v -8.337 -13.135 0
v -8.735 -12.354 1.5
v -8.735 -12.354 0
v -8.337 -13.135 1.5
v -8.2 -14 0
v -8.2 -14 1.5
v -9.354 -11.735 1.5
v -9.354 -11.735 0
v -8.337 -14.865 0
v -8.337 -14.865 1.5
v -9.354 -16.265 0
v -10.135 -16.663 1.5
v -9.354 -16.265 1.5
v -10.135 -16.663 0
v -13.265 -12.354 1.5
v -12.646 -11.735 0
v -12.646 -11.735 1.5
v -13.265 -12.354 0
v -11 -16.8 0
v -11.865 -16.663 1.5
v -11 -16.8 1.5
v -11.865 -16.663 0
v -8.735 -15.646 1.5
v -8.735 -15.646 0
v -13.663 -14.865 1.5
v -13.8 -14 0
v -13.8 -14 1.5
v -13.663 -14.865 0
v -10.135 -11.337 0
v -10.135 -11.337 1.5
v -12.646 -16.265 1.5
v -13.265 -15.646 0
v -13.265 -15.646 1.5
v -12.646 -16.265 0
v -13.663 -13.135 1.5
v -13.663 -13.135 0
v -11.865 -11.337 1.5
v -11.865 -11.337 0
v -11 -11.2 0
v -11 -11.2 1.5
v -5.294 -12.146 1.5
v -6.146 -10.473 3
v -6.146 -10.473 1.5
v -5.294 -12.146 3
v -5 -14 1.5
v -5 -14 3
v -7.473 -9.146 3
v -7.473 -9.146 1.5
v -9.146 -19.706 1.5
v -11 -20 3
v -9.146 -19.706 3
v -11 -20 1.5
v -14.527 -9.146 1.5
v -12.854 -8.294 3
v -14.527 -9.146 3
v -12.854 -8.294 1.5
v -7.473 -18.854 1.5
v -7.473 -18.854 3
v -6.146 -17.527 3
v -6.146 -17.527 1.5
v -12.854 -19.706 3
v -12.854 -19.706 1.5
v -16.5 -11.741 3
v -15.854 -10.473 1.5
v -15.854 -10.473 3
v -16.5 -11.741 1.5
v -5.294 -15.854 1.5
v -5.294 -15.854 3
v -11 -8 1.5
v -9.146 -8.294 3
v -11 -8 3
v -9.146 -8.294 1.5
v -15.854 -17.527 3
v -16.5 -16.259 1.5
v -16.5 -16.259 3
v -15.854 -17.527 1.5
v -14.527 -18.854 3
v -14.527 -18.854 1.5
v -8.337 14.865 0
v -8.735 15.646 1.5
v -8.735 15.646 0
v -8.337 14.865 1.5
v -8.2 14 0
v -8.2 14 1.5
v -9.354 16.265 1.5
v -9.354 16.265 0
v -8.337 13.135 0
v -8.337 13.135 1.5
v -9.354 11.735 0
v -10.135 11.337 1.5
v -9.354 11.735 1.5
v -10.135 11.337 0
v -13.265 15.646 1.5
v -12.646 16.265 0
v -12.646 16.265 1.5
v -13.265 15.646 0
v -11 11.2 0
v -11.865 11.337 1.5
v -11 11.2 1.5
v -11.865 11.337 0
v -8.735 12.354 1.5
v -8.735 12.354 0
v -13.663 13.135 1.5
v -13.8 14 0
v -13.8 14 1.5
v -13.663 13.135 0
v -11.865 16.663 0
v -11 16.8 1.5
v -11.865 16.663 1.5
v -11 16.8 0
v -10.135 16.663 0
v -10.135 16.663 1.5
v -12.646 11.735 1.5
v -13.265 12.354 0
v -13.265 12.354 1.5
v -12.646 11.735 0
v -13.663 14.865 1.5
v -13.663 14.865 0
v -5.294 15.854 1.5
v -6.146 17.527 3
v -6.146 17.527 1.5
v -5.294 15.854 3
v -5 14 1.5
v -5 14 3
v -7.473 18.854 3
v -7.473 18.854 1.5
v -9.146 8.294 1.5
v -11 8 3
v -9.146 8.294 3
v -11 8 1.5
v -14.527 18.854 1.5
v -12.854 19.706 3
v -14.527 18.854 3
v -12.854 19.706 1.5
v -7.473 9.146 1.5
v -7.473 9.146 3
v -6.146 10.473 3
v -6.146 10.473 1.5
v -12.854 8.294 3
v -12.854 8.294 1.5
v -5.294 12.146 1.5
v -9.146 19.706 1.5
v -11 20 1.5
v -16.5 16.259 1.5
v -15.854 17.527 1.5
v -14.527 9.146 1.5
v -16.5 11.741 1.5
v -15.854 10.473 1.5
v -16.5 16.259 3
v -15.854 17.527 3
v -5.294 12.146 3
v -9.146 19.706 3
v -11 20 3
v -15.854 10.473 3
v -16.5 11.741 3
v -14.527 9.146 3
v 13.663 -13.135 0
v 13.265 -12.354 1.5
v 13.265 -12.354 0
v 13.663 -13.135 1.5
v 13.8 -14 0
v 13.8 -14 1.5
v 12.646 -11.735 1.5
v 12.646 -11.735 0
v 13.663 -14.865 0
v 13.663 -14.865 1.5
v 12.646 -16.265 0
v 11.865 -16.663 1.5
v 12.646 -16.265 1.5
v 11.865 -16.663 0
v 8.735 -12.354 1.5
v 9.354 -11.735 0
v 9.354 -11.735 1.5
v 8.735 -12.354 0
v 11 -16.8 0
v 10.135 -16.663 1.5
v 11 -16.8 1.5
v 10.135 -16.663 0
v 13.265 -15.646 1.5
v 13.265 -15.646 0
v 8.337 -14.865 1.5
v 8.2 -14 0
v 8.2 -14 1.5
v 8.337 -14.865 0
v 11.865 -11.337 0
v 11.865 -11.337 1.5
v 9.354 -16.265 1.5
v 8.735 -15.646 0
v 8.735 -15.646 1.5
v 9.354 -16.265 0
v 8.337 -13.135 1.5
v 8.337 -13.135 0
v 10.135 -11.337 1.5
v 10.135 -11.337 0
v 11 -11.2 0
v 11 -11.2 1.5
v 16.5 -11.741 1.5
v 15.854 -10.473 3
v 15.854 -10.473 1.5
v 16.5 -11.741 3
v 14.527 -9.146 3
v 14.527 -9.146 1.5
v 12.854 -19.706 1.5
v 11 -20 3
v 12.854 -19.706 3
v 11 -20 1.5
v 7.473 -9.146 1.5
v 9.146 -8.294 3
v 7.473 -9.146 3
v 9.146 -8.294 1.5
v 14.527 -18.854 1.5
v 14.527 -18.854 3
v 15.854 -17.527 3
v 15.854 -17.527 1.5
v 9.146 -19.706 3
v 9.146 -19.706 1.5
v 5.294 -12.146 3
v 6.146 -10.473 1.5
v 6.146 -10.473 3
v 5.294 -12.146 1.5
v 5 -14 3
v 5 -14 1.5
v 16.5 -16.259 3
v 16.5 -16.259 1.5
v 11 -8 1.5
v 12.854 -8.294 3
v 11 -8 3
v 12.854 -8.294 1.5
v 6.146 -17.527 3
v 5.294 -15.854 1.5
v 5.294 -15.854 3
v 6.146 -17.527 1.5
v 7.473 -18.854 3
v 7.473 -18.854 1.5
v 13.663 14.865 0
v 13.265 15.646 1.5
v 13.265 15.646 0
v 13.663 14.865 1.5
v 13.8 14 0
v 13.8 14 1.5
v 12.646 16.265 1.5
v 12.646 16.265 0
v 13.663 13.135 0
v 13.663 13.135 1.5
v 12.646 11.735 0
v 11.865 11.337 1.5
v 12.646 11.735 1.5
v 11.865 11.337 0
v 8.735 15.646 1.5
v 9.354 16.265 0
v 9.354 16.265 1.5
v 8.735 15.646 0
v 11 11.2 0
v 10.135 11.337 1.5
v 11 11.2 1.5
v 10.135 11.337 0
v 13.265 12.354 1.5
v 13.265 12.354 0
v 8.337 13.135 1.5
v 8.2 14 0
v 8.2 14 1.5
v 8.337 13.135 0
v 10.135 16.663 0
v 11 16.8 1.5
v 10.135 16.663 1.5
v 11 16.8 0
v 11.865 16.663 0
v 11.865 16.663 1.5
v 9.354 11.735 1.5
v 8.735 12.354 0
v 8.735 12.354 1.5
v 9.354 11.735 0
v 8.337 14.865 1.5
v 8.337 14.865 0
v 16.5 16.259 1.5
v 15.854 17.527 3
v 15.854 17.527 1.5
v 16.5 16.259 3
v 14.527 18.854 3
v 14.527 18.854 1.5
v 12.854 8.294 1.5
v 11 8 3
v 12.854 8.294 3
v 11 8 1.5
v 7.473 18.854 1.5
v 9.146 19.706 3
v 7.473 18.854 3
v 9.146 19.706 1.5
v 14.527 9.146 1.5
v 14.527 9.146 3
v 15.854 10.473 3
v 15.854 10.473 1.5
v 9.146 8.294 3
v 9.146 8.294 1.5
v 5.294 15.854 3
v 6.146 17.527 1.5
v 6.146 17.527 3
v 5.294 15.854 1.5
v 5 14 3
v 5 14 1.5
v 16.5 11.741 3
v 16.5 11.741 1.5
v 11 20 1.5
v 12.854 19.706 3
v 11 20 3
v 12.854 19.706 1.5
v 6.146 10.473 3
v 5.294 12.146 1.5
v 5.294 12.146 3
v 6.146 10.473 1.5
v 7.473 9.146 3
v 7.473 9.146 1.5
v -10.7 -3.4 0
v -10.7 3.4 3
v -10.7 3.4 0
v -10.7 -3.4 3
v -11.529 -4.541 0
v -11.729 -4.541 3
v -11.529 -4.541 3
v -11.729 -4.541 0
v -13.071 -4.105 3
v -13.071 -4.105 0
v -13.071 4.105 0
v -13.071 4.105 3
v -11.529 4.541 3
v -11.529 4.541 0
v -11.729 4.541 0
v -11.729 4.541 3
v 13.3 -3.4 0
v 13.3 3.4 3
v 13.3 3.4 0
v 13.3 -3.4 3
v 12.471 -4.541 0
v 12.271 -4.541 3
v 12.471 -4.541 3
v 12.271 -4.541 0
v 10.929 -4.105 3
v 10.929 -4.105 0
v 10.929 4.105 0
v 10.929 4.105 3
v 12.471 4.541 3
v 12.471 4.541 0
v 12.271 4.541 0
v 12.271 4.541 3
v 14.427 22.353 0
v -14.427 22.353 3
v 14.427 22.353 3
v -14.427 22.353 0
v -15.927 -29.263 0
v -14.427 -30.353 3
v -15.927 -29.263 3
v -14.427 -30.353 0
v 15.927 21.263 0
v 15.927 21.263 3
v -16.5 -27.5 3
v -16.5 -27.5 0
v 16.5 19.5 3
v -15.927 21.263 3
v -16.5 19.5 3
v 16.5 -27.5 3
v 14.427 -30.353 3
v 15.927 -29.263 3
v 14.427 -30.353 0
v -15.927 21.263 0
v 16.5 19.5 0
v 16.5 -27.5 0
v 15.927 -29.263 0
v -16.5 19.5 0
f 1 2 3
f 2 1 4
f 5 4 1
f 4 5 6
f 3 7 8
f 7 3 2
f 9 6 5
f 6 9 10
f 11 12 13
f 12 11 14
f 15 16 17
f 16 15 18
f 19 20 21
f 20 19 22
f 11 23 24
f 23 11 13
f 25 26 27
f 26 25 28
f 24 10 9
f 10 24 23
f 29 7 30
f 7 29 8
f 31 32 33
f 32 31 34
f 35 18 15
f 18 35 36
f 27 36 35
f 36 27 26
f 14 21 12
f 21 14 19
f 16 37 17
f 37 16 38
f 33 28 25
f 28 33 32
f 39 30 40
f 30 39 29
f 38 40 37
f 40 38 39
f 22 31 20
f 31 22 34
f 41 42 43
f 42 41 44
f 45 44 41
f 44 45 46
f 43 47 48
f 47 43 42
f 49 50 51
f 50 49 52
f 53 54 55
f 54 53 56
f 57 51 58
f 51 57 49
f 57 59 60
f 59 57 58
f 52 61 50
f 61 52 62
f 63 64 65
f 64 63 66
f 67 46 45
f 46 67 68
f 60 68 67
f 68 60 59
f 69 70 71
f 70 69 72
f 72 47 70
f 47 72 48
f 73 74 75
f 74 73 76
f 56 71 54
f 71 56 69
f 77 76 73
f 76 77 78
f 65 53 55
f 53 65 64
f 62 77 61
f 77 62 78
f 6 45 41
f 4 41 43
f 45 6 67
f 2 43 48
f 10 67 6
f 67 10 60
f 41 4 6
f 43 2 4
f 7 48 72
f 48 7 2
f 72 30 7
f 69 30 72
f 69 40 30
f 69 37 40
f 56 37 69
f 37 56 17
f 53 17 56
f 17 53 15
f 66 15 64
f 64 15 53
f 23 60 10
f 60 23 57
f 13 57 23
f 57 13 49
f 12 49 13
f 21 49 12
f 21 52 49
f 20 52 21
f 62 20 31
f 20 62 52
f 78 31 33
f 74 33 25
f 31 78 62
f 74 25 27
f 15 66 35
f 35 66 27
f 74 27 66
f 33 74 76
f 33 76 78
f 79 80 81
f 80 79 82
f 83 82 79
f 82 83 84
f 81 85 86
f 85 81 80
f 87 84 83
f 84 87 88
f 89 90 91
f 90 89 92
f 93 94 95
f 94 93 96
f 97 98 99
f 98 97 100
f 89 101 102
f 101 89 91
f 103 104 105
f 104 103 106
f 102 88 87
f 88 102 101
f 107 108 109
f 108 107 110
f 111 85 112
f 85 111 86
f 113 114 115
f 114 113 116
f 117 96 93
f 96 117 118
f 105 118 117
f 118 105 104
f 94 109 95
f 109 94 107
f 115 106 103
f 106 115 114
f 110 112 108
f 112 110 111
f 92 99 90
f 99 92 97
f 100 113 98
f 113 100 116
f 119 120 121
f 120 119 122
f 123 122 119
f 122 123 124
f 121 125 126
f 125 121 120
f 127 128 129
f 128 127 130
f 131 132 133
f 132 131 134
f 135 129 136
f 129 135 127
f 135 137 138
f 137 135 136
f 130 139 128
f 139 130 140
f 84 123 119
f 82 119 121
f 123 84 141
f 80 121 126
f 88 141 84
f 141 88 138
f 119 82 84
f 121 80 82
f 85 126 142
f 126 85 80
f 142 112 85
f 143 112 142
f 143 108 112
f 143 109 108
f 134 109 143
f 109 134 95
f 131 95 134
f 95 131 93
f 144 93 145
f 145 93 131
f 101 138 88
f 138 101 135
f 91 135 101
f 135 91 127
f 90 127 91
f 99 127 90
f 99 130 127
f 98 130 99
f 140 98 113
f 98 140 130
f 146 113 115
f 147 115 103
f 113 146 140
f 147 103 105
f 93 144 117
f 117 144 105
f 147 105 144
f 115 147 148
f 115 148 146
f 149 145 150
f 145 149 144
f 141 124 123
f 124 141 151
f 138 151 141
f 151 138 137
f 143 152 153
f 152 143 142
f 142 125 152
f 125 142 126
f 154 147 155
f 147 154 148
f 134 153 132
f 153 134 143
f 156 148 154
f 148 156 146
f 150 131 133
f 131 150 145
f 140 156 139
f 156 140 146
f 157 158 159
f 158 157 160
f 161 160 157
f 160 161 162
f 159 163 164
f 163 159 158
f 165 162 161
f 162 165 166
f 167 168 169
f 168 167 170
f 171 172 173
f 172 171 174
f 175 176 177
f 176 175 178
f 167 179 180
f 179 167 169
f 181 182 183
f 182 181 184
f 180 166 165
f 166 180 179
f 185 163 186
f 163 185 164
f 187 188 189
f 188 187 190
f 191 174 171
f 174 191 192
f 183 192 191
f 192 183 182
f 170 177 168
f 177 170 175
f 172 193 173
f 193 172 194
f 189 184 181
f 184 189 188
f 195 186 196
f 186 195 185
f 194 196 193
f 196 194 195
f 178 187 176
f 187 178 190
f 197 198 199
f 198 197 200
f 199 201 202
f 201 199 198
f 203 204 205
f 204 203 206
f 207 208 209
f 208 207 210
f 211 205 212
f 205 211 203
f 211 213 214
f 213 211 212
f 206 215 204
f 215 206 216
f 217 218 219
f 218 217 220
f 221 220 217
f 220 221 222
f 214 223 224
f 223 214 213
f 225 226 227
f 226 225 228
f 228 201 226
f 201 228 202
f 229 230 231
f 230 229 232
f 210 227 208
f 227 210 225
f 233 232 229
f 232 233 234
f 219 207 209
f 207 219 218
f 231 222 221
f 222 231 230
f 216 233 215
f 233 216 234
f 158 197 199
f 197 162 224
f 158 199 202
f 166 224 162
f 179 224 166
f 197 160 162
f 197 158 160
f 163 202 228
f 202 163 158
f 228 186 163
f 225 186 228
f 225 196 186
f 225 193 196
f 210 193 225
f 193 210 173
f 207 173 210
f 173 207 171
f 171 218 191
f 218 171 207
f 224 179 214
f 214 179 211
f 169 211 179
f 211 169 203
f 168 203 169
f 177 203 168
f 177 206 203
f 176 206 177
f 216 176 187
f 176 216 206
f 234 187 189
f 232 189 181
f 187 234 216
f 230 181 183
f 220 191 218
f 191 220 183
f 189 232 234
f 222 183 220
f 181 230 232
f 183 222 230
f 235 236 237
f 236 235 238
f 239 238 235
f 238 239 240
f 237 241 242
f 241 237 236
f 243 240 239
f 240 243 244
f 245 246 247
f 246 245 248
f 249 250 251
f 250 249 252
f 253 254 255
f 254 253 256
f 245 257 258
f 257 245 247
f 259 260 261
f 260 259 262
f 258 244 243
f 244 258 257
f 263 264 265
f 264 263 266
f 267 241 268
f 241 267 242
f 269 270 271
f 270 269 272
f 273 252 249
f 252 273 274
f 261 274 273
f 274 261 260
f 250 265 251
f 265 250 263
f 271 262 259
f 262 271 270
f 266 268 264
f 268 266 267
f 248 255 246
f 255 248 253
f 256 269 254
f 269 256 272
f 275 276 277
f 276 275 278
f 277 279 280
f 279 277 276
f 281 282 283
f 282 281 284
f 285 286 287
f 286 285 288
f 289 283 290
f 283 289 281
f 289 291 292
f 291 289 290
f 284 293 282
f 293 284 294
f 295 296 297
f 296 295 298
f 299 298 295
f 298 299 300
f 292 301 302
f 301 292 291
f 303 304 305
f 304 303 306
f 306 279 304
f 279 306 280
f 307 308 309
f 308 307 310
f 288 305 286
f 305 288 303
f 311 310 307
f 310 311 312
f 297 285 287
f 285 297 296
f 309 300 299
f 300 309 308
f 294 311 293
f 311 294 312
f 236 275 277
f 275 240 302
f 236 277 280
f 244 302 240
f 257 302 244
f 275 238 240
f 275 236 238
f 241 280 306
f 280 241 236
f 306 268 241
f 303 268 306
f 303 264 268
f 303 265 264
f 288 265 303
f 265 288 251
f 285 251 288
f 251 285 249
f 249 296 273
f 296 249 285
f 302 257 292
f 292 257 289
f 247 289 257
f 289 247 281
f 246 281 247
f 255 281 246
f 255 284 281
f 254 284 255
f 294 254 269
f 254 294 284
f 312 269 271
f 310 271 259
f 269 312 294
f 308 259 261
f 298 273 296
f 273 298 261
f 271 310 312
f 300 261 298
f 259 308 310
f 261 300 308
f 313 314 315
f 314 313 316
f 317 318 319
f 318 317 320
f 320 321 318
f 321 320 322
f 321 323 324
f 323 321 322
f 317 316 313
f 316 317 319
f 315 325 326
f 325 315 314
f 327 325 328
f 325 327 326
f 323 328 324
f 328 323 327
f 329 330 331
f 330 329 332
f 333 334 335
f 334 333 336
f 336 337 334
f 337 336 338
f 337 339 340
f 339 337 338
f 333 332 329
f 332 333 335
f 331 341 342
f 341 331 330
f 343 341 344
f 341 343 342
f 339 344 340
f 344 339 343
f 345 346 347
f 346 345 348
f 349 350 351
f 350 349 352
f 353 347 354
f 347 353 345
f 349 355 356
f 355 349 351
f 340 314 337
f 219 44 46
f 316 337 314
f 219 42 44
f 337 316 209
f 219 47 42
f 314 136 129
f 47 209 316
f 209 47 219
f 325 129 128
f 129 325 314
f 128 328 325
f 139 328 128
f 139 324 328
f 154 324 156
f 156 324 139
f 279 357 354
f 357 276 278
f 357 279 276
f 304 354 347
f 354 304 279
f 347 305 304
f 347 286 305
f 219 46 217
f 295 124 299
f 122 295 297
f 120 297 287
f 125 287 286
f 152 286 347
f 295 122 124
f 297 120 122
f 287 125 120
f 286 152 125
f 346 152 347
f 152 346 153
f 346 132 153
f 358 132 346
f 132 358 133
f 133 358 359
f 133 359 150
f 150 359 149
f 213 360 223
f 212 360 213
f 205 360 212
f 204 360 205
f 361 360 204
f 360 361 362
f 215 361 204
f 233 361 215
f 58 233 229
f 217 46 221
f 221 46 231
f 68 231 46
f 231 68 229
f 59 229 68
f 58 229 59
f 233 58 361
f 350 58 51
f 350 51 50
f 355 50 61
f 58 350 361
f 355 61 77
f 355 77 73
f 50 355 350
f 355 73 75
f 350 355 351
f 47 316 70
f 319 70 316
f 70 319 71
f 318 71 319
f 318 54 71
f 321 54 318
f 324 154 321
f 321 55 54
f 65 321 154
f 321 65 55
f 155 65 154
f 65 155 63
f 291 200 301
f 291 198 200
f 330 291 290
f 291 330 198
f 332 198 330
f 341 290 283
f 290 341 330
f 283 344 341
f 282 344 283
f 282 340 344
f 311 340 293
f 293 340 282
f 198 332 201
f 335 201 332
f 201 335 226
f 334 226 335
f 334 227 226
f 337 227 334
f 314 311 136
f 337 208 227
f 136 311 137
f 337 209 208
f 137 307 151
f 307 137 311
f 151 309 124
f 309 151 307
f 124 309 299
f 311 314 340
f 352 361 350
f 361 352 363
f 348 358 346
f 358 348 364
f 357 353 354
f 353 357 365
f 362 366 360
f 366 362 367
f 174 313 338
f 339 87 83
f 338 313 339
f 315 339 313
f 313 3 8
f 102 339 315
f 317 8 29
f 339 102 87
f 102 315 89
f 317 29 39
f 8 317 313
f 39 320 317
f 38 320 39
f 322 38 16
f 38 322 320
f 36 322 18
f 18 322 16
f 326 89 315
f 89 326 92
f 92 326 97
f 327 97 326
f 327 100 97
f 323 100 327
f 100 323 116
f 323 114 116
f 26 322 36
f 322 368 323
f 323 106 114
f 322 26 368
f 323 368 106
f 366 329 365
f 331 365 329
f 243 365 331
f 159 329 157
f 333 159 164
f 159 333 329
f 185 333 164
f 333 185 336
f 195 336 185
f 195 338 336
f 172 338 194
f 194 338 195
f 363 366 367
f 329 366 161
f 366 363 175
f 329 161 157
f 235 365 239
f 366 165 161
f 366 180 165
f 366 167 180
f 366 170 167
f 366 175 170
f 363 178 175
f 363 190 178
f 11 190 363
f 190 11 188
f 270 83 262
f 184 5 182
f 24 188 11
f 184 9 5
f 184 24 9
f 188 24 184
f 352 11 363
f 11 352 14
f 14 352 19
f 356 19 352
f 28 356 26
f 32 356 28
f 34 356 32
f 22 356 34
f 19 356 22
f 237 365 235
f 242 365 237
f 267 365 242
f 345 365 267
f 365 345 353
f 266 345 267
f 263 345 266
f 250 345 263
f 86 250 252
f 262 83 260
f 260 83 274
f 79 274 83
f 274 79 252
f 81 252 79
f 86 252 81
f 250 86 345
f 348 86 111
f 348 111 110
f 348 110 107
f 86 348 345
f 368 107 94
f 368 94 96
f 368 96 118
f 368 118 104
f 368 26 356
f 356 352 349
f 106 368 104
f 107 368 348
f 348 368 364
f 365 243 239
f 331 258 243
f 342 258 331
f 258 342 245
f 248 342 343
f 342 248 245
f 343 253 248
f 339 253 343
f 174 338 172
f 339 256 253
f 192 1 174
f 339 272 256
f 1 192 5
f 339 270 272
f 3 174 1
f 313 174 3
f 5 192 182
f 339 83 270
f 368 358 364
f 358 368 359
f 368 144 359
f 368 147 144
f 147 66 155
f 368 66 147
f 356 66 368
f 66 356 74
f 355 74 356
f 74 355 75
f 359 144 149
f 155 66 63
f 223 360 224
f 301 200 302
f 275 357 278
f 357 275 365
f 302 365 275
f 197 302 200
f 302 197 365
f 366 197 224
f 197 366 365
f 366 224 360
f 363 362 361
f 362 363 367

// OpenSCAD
// file: dronePlates.scad
/**
 * dronePlates.scad
 * Plate library
 *
 * GNU GPL V3
 * @author: Victor Potenciano
 */

m3Rad = 3.4/2;
cornerR = 4;

/**
 *
 */
module helperDisk(diameter) {
	cylinder(r = diameter/2, h = 0.6, $fn=20);
}

/**
 *
 */
module roundedRect(size, radius) {
	x = size[0];
	y = size[1];
	z = size[2];

	linear_extrude(height=z)
	hull() {
	// place 4 circles in the corners, with the given radius
	translate([(-x/2)+(radius/2), (-y/2)+(radius/2), 0]){ circle(r=radius); }
	translate([(x/2)-(radius/2), (-y/2)+(radius/2), 0]){ circle(r=radius); }
	translate([(-x/2)+(radius/2), (y/2)-(radius/2), 0]){ circle(r=radius); }
	translate([(x/2)-(radius/2), (y/2)-(radius/2), 0]){ circle(r=radius); }
	}
}

/**
 * rounded rectangle triangle with corner at origin
 */
module roundedTriangle(size, radius) {
	x = size[0];
	y = size[1];
	z = size[2];

	linear_extrude(height=z)
	hull() {
	translate([radius, radius, 0]){ circle(r=radius); }
	translate([x-radius, radius, 0]){ circle(r=radius); }
	translate([radius, y-radius, 0]){ circle(r=radius); }
	}
}

/**
 *
 */
module roundRectPlate(w, l, plateThick=3) {
	difference(){
		roundedRect([l+m3Rad*1.75,w+m3Rad*1.75,plateThick], cornerR);
		translate([l/2, w/2, -0.5]) { cylinder(h = plateThick+1, r = m3Rad, $fn=30); }
		translate([-l/2, w/2, -0.5]) { cylinder(h = plateThick+1, r = m3Rad, $fn=30); }
		translate([l/2, -w/2, -0.5]) { cylinder(h = plateThick+1, r = m3Rad, $fn=30); }
		translate([-l/2, -w/2, -0.5]) { cylinder(h = plateThick+1, r = m3Rad, $fn=30); }
	}
}

/**
 *
 */
module crossSquarePlate(l, thick=3) {
	inDist = cornerR*2+4;
	trianL = sqrt((l*l)/2)-inDist;
	centerR = 4;

	difference(){
		roundRectPlate(l, l, thick);
		translate([0, centerR, -0.5]) { 
			rotate([0,0,45]){ roundedTriangle([trianL,trianL,thick+1], cornerR-2); }
		}
		translate([0, -centerR, -0.5]) { 
			rotate([0,0,225]){ roundedTriangle([trianL,trianL,thick+1], cornerR-2); }
		}
		translate([-centerR, 0, -0.5]) { 
			rotate([0,0,135]){ roundedTriangle([trianL,trianL,thick+1], cornerR-2); }
		}
		translate([centerR, 0, -0.5]) { 
			rotate([0,0,-45]){ roundedTriangle([trianL,trianL,thick+1], cornerR-2); }
		}
	}
}

/**
 *
 */
module hShapePlate(w, l, thick=4) {
	inDist = cornerR*2+1;

	difference(){
		roundRectPlate(w, l, thick);
		translate([0, w/4, -0.5]) { roundedRect([l-inDist,w/2-inDist,thick+1], cornerR-2); }
		translate([0, -w/4, -0.5]) { roundedRect([l-inDist,w/2-inDist,thick+1], cornerR-2); }
	}
}

/**
 *
 */
module motorCircleMount(inDia, outDia, thick=3, extraH=false, d1=19, d2=16, holeR=m3Rad ) {
	difference(){
		cylinder(h = thick, r = outDia/2, $fn=30);
		motorCircleMountHoles(inDia, outDia, thick, extraH, d1=d1, d2=d2, holeR=holeR);
	}
}

/**
 *
 */
module motorCircleMountHoles(inDia, outDia, thick=3, extraH=false, d1=19, d2=16, d3=25, holeR=m3Rad) {
	translate([0, 0, -0.5]) { cylinder(h = thick+1, r = inDia/2, $fn=30); }

	for(i=[0:3]) {
		rotate([0,0,90*i]){
		translate([d1/2, 0, -0.5]) cylinder(h = thick+1, r = holeR, $fn=20);
		translate([d2/2, 0, -0.5]) cylinder(h = thick+1, r = holeR, $fn=20);
		translate([d2/2, -holeR, -0.5]) cube(size = [(d1-d2)/2,holeR*2,thick+1]);
		}
	}
	
	if(extraH==true){	
		for(i=[-1,1]) translate([i*d3/2, 0, -0.5]) { cylinder(h = thick+1, r = holeR, $fn=30); }
	}
}

/**
 *
 */
module motorRectMount(w, l, inDia, thick=3) {
	d1=19;
	d2=16;

	difference(){
		roundRectPlate(w, l, thick);
		translate([0, 0, -0.5]) { cylinder(h = thick+1, r = inDia/2, $fn=30); }
		translate([0, d1/2, -0.5]) { cylinder(h = thick+1, r = m3Rad, $fn=30); }
		translate([0, -d1/2, -0.5]) { cylinder(h = thick+1, r = m3Rad, $fn=30); }
		translate([d2/2, 0, -0.5]) { cylinder(h = thick+1, r = m3Rad, $fn=30); }
		translate([-d2/2, 0, -0.5]) { cylinder(h = thick+1, r = m3Rad, $fn=30); }
	}
}

/**
 *
 */
module tube(inDia, outDia, height) {
	difference(){
		cylinder(h = height, r = outDia/2, $fn=50);
		translate([0, 0, -0.5]) { cylinder(h = height+1, r = inDia/2, $fn=30); }
	}
}

/**
 *
 */
module squareTube(inDia, outDia, height) {
	translate([0,0,height/2]){
	difference(){
		cube(size = [outDia,outDia,height], center = true);
		cube(size = [inDia,inDia,height+1], center = true);
	}
	}
}

/**
 *
 */
module djiFlamewheelHoles(height) {
	a = 23;
	b = 16;
	c = 19.5;
	
	translate([a/2, c/2, 0]) { cylinder(h = height, r = m3Rad, $fn=30); }
	translate([-a/2, c/2, 0]) { cylinder(h = height, r = m3Rad, $fn=30); }
	translate([b/2, -c/2, 0]) { cylinder(h = height, r = m3Rad, $fn=30); }
	translate([-b/2, -c/2, 0]) { cylinder(h = height, r = m3Rad, $fn=30); }
}

/**
 *
 */
module djiFlamewheelHolesBotton(height) {
	a1 = 21;
	c = 19.5;
	
	translate([a1/2, c/2, 0]) { cylinder(h = height, r = m3Rad, $fn=30); }
	translate([-a1/2, c/2, 0]) { cylinder(h = height, r = m3Rad, $fn=30); }
}

/**
 *
 */
module propeller(size){
union(){
difference(){
	cylinder(h = 3, r = size/2, center=true, $fn=30);
	cylinder(h = 3.1, r = size/2-2, center=true, $fn=30); 
}
for( i = [-1,1] ){
rotate([0,0,45*i]){ cube(size = [size,4,1], center = true); }
}
}
}

/**
 *
 */
module slot(length, height, rad){
for(i=[-1,1]) translate([i*length/2,0,0]) cylinder(h = height, r = rad, $fn=30);
translate([0,0,height/2]) cube(size = [length,rad*2,height], center = true);
}

 

////////////////////////
// Examples:
////////////////////////

motorCircleMount(8, 25, 3.5);

//roundedRect([50,50,3], 4);

//hShapePlate(79, 25);

//rotate([0,0,45]){roundedTriangle([40,40,3], 4);}

//crossSquarePlate(45, 4);

/*
union(){
motorRectMount(21, 18, 8, 4);
translate([9, 10.5, 0]) {tube(m3Rad*2, 6.5, 6);}
}
*/

/*
difference(){
union(){
hShapePlate(50, 30, 3.5);
translate([-4,-25,0]){cube(size = [8,50,3.5]);}
rotate([0, 0, 45]) {motorCircleMount(8, 35, 3.5);}
}
cylinder(h = 10, r = 4, $fn=100, center=true);
}
*/

//rotate([90,0,0]){ tube(5,10,20); }
//translate([20,0,0]){ squareTube(5, 10, 20); }
// main file
/**
 *
 */
 
use <dronePlates.scad>;

m3Rad = 3.4/2;
plateThick = 3;

difference(){

translate([0,-4,0])
union(){
	roundedRect([30,50,plateThick],3);
}


for ( i = [-1,1]) for ( j = [-1,1]){ //mobius bobbins holes
	translate([i*22/2,j*28/2,-0.5]){
		cylinder(r=5.6/2,h=plateThick+1,$fn=20);
		translate([0,0,plateThick/2+0.5]) cylinder(r=6,h=plateThick,$fn=20);
	}
}

//voids
for ( i = [-1,1]) translate([i*12,0,-0.5]) roundedRect([1,8,plateThick+2],1.2);

}//diff
